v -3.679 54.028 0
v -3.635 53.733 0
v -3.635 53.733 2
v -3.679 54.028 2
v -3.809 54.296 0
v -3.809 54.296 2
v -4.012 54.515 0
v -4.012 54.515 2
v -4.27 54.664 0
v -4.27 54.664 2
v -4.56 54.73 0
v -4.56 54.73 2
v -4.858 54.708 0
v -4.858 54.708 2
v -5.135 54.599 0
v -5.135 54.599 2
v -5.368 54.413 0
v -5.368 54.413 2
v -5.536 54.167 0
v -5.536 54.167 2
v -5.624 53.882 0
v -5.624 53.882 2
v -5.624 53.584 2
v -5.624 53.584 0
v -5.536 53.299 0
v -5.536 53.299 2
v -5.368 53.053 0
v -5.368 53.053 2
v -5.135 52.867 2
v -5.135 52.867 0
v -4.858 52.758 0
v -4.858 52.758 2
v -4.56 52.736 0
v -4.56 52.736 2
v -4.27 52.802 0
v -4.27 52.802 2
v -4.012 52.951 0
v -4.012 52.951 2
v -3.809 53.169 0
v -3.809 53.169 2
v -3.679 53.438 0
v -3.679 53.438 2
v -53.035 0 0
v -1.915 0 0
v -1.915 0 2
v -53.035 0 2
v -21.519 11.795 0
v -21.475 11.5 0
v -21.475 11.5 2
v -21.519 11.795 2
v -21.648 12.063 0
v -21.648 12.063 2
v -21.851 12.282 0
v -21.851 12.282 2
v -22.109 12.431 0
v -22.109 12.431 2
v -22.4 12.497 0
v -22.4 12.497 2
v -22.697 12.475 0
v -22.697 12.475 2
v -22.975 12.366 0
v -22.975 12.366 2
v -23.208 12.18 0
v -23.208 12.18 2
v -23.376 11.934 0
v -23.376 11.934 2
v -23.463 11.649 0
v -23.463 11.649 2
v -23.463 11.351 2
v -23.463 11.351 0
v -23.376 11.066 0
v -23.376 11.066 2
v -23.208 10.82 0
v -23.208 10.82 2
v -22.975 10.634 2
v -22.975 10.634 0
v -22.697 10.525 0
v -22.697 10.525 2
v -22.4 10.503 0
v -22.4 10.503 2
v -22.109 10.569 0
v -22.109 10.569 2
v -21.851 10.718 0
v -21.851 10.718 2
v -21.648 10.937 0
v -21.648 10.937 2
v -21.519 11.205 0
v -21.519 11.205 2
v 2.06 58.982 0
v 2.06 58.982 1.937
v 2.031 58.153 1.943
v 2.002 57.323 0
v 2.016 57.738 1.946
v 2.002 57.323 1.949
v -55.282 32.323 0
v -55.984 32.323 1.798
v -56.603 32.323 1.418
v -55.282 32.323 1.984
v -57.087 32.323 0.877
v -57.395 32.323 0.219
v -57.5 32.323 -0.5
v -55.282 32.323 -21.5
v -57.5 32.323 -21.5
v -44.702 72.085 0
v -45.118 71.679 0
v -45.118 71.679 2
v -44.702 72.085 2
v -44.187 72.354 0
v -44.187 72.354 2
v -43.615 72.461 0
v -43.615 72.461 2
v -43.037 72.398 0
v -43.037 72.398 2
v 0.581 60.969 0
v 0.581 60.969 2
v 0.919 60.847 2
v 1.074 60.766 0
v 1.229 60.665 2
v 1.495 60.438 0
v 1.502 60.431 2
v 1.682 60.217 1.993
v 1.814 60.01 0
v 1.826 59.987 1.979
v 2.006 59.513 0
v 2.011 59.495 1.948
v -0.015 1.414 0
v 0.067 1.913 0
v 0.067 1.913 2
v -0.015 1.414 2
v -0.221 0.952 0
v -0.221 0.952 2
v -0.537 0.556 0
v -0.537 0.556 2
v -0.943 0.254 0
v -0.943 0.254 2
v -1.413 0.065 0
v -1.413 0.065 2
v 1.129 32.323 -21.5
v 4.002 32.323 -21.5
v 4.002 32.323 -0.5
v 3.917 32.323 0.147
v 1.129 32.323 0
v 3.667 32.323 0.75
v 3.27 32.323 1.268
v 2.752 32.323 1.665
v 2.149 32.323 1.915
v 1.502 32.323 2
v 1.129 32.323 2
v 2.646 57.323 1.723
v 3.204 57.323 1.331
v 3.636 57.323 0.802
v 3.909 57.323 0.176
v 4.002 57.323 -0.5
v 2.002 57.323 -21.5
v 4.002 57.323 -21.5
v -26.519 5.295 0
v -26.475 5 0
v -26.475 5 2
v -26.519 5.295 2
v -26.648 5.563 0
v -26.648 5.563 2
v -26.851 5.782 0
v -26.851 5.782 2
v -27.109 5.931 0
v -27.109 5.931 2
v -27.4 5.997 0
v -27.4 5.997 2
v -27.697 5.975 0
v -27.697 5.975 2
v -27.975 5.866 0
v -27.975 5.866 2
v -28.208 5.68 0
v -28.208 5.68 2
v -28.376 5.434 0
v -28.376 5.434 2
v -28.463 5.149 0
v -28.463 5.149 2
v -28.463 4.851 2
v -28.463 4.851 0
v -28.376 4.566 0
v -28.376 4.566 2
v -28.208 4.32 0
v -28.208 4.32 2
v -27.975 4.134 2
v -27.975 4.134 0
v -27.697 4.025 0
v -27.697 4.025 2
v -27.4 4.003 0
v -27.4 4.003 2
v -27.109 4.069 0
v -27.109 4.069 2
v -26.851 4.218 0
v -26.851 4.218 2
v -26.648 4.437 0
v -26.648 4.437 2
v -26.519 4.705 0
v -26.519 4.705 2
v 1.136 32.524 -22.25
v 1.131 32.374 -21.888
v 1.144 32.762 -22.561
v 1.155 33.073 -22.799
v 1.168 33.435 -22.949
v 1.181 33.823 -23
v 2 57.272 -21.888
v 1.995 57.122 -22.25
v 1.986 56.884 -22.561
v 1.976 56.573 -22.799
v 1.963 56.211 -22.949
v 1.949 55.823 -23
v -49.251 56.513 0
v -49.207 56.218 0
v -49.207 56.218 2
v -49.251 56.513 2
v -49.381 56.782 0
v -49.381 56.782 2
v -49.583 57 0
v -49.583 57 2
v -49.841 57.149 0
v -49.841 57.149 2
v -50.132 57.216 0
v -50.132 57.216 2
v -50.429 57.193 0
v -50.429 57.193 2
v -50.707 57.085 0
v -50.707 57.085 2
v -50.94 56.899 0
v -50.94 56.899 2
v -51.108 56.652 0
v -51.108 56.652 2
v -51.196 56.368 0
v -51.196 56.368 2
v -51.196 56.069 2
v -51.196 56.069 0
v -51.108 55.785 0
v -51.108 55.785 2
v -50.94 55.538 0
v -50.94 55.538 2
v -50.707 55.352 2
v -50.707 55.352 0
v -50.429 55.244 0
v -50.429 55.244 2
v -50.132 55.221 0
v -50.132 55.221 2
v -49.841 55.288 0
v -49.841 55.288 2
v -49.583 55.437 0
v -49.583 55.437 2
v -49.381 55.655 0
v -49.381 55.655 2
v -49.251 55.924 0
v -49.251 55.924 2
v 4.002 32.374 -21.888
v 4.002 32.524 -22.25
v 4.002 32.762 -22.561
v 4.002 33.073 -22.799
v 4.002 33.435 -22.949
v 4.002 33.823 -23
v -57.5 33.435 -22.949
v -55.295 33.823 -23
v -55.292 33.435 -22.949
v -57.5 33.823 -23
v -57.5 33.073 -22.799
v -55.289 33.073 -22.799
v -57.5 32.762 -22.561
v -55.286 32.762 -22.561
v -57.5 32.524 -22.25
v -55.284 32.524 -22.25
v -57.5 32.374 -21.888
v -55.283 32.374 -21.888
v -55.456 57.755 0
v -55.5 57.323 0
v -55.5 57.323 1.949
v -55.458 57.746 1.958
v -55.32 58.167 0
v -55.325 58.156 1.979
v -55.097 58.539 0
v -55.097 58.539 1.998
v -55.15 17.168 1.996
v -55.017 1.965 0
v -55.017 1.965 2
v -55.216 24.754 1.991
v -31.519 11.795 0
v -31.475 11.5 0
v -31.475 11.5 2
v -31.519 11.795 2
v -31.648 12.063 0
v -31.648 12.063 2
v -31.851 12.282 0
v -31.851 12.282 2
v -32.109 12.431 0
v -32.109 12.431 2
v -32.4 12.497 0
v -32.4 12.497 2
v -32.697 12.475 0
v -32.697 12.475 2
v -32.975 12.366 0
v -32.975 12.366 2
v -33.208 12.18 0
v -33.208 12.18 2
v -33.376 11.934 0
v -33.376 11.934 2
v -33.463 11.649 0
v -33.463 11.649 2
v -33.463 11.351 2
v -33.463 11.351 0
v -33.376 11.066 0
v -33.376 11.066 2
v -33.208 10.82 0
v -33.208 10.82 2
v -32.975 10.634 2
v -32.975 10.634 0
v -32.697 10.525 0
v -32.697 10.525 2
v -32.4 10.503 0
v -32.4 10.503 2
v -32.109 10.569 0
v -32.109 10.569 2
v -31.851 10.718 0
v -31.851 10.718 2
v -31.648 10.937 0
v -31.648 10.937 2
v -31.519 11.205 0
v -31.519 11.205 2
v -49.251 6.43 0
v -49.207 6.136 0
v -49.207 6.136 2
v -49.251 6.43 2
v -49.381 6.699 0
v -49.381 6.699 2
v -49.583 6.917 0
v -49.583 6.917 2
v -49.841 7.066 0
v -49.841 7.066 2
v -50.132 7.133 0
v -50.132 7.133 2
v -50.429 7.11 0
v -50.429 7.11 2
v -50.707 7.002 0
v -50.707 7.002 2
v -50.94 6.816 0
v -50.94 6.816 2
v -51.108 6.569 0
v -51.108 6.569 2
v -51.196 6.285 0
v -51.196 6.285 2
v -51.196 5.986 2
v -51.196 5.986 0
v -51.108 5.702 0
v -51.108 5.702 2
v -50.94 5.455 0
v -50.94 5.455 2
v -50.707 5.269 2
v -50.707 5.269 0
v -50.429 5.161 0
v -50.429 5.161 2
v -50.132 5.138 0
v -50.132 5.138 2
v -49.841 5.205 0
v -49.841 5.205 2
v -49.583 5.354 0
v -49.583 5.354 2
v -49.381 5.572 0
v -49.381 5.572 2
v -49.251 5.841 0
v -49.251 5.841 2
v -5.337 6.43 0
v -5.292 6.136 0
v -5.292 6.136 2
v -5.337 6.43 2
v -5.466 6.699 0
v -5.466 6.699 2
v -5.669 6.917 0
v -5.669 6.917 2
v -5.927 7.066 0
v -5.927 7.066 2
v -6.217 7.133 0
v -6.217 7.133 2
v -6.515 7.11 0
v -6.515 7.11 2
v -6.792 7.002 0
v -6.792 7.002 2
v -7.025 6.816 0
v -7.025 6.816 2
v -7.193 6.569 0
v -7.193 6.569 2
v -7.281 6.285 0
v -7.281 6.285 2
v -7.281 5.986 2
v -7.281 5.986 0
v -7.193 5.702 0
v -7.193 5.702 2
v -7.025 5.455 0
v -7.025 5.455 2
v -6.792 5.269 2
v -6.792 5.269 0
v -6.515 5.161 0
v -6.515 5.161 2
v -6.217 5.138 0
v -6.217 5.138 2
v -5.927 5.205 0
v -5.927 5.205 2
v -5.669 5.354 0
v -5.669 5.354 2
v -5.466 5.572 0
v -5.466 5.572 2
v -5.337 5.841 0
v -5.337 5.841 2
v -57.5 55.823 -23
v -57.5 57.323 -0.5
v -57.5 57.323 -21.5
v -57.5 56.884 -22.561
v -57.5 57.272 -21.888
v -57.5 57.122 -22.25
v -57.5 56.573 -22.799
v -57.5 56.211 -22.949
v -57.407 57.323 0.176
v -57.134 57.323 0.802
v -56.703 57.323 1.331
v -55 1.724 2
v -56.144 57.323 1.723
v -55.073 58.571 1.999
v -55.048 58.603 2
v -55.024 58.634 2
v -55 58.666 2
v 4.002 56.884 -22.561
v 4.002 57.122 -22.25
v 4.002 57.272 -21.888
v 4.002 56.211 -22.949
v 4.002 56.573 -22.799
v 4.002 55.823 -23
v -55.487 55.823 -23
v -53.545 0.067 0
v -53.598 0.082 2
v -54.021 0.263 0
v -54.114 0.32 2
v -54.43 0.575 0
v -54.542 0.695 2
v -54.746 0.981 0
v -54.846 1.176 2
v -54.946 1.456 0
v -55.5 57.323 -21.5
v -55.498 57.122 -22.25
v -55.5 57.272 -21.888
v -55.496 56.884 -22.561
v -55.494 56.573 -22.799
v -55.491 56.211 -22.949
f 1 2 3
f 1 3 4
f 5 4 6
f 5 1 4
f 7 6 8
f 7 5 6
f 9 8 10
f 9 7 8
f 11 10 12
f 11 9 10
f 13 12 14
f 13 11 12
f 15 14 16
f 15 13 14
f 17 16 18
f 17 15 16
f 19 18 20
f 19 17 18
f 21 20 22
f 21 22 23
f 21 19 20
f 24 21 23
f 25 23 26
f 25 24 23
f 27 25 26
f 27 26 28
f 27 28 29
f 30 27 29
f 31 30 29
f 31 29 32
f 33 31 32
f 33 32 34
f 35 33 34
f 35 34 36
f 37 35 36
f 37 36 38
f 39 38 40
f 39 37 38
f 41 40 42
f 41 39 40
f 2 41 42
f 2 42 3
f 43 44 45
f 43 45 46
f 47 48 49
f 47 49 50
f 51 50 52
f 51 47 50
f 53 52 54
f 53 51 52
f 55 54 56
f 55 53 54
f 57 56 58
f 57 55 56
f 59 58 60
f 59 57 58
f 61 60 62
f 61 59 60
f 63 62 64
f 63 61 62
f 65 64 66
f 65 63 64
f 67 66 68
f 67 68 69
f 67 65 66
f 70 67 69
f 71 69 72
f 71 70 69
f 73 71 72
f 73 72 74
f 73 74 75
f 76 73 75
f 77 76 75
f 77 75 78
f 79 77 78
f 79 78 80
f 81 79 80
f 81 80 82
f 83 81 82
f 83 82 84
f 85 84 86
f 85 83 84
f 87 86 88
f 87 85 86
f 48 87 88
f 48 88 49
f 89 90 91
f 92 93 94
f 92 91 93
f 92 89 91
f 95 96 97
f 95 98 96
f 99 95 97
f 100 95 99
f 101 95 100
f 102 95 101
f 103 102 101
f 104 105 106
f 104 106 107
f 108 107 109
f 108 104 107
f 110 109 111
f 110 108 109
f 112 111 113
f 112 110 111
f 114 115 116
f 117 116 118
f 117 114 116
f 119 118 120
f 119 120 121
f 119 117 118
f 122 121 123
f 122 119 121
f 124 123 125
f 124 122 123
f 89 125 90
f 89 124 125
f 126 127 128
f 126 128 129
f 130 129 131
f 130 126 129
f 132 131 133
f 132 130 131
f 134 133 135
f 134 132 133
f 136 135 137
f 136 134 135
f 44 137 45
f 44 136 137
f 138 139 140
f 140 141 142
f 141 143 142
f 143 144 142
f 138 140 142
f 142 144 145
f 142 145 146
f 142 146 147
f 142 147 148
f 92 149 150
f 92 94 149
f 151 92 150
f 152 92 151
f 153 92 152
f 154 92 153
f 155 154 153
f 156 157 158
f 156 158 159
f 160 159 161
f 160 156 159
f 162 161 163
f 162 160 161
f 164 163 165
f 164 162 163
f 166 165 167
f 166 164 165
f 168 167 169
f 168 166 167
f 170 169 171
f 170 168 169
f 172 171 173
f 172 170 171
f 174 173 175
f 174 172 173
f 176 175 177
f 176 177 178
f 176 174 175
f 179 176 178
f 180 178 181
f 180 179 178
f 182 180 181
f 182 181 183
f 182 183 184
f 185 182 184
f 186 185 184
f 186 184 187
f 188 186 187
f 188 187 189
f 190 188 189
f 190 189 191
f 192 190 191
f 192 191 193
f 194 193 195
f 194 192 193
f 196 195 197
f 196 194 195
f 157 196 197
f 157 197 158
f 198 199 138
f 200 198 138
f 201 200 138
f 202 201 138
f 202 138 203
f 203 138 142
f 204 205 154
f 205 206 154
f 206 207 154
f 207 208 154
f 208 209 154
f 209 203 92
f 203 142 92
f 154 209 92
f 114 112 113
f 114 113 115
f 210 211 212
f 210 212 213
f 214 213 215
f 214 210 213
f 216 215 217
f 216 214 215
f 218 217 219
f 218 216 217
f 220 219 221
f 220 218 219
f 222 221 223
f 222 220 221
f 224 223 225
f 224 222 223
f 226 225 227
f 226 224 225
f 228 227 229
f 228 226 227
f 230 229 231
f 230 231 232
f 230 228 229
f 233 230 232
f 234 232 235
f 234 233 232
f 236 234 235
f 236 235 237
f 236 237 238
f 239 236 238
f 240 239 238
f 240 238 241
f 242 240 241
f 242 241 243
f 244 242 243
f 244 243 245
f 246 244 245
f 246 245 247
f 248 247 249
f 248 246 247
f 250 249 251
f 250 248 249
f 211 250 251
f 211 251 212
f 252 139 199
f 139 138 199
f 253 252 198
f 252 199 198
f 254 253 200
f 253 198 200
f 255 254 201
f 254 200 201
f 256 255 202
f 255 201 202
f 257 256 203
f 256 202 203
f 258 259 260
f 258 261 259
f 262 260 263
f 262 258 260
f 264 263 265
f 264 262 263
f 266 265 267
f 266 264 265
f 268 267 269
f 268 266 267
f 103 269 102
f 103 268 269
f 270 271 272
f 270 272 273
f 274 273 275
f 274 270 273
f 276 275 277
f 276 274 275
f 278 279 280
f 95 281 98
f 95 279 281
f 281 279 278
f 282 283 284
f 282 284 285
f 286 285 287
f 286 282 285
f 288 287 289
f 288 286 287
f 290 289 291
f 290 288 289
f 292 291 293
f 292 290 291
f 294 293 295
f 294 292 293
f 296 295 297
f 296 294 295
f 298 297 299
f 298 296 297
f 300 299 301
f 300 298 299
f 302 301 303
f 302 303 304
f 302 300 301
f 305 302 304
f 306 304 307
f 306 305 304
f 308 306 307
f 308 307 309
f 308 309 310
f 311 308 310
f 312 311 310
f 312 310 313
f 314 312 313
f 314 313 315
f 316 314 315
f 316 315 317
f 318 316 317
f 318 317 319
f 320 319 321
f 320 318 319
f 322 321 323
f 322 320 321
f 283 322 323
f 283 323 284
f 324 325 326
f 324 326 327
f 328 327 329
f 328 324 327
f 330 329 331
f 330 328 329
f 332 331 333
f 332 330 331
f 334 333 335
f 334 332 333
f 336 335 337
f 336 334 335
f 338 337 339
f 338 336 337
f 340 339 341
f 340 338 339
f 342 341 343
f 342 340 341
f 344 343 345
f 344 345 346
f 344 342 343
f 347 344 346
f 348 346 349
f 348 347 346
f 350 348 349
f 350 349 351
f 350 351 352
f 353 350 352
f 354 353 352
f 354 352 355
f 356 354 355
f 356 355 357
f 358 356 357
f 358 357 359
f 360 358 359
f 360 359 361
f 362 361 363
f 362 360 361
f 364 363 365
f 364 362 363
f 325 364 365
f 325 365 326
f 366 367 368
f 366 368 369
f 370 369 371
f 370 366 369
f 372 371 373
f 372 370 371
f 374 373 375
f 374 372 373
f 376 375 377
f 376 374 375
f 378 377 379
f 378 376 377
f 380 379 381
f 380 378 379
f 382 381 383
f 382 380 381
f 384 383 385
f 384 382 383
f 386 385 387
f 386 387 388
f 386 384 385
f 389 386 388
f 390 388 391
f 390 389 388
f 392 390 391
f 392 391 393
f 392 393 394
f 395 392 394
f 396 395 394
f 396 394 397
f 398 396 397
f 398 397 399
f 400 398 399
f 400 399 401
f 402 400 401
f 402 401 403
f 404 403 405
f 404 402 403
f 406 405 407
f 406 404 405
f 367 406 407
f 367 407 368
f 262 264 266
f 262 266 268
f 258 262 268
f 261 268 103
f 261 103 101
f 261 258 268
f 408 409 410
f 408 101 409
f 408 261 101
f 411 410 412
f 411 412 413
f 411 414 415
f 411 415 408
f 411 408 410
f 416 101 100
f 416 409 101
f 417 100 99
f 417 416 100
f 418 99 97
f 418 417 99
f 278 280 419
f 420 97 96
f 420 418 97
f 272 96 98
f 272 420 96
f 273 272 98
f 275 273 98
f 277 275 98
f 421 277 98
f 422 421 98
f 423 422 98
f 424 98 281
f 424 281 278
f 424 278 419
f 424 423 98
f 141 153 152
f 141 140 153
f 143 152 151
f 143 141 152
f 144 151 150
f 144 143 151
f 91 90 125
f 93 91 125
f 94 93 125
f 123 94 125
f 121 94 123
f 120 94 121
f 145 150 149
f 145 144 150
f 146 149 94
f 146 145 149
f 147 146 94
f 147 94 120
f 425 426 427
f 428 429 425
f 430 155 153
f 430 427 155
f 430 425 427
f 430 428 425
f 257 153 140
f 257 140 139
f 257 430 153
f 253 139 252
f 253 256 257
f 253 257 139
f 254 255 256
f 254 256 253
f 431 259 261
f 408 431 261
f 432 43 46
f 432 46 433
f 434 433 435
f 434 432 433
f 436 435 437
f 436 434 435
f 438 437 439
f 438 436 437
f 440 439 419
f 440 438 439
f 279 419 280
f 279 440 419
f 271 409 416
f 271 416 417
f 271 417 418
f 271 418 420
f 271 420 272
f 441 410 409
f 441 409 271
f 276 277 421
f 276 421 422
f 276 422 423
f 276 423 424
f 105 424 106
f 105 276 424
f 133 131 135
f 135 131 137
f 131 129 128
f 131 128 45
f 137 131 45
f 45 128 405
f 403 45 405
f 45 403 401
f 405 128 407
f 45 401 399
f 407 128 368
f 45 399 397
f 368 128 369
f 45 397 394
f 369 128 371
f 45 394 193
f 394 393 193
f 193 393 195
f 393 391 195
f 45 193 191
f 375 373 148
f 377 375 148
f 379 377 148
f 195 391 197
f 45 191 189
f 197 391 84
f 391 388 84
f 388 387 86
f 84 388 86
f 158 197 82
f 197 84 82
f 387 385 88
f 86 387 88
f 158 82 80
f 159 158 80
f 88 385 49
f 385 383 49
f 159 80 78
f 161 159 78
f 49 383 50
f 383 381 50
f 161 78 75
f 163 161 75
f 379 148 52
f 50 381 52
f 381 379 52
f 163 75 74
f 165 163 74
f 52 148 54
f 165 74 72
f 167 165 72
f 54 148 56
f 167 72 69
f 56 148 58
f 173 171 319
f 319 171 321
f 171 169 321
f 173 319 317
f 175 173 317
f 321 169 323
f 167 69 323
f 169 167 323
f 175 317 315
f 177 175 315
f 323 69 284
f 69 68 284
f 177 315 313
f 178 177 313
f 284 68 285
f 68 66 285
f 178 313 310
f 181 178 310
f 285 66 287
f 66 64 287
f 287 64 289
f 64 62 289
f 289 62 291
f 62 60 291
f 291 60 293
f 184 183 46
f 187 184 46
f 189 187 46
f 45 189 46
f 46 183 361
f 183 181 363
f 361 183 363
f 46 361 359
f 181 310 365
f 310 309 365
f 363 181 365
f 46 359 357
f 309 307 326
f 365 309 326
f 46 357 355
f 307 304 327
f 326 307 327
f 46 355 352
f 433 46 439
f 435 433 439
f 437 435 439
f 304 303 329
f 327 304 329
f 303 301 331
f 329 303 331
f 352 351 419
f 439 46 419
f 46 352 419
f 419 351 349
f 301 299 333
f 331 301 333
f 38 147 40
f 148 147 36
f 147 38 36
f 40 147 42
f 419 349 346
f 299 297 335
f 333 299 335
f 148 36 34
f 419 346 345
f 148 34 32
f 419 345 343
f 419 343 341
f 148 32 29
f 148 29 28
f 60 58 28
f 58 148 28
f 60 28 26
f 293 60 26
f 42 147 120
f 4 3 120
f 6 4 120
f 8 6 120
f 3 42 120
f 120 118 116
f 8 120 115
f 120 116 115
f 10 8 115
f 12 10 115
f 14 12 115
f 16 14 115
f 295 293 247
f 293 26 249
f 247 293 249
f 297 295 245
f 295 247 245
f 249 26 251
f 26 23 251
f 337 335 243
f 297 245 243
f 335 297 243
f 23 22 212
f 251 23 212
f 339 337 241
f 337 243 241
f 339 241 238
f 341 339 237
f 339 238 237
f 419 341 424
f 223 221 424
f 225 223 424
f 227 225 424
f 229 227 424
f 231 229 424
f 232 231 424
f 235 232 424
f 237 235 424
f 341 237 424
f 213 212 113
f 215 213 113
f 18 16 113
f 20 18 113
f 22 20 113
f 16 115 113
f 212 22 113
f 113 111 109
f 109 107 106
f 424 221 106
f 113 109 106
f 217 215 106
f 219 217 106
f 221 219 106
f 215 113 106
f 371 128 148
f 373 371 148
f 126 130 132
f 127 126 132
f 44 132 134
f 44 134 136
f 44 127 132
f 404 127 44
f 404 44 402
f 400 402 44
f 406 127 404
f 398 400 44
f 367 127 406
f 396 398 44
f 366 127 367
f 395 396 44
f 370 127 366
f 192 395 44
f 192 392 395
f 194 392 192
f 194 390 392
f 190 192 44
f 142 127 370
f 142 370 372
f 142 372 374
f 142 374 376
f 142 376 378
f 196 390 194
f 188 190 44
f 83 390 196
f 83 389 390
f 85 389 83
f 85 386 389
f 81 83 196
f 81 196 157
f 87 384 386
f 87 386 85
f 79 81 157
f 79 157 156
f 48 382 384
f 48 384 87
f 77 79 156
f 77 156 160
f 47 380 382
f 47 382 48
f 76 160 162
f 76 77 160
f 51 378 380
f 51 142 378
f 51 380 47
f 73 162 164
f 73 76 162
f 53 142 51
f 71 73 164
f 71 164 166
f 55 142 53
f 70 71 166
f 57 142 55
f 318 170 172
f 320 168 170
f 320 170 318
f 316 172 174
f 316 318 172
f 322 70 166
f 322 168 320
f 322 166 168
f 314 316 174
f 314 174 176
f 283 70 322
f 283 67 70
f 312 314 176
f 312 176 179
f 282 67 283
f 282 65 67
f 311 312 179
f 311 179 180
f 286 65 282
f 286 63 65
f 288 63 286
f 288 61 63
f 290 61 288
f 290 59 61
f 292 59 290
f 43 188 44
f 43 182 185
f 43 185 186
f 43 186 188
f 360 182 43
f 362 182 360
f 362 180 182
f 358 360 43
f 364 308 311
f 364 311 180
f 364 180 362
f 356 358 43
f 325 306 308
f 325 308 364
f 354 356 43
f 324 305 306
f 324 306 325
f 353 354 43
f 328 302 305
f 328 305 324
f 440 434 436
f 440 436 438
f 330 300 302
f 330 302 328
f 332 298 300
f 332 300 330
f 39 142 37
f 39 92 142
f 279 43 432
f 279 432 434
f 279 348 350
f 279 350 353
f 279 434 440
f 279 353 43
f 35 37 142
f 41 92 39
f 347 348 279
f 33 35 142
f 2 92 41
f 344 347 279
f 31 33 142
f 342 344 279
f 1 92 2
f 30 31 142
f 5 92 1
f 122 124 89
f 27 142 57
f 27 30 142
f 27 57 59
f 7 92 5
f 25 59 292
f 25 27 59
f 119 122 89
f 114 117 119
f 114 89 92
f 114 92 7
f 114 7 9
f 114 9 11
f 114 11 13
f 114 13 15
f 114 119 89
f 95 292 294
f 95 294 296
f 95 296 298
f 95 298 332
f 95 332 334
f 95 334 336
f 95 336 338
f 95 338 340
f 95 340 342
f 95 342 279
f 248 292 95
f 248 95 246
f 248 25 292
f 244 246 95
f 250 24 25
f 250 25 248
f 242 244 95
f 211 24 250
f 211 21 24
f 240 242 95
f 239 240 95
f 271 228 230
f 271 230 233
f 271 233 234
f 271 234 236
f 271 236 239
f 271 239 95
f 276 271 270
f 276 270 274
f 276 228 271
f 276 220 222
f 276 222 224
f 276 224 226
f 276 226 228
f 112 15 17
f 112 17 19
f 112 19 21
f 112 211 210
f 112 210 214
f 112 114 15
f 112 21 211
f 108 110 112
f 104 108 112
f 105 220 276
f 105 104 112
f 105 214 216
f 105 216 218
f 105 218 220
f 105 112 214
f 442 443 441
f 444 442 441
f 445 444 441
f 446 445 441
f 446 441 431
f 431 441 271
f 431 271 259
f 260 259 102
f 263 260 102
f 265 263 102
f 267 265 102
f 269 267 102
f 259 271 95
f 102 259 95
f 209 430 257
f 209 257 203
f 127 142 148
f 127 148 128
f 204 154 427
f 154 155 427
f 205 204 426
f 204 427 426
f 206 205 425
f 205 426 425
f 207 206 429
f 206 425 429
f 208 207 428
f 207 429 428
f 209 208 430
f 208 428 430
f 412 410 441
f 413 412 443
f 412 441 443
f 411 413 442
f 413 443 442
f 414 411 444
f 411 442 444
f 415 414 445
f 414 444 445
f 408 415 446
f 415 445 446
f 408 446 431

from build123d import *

# Parameters (mm, degrees)
SKETCH1_R             = 1
BOSS_EXTRUDE1_DEPTH   = 2
BOSS_EXTRUDE2_DEPTH   = 23
BOSS_EXTRUDE2_2_DEPTH = 23
BOSS_EXTRUDE3_DEPTH   = 2
FILLET1_R             = 2.5
FILLET2_R             = 1.5


with BuildPart() as part:
    # Sketch1 → Boss-Extrude1 (new body)
    with BuildSketch(Plane.XY):
        with BuildLine():
            Line((-1.914568893, 0), (-53.034632217, 0))
            ThreePointArc((-53.034632217, 0), (-54.430407674, 0.574584772), (-55.017150852, 1.965292948))
            Line((-55.017150852, 1.965292948), (-55.500249363, 57.322899279))
            ThreePointArc((-55.500249363, 57.322899279), (-55.399437354, 57.964587872), (-55.09663904, 58.539253421))
            Line((-55.09663904, 58.539253421), (-45.118252169, 71.678754712))
            ThreePointArc((-45.118252169, 71.678754712), (-44.186512298, 72.353695471), (-43.03683386, 72.39755554))
            Line((-43.03683386, 72.39755554), (0.580818713, 60.968995882))
            ThreePointArc((0.580818713, 60.968995882), (1.66875601, 60.234846813), (2.059695099, 58.981950551))
            Line((2.059695099, 58.981950551), (0.066817491, 1.913402589))
            ThreePointArc((0.066817491, 1.913402589), (-0.537343288, 0.556435263), (-1.914568893, 0))
        make_face()
        with Locations((-27.474600555, 5)):
            Circle(SKETCH1_R, mode=Mode.SUBTRACT)
        with Locations((-22.474600555, 11.5)):
            Circle(SKETCH1_R, mode=Mode.SUBTRACT)
        with Locations((-32.474600555, 11.5)):
            Circle(SKETCH1_R, mode=Mode.SUBTRACT)
        with Locations((-6.292158567, 6.135518638)):
            Circle(SKETCH1_R, mode=Mode.SUBTRACT)
        with Locations((-50.206815558, 6.135518638)):
            Circle(SKETCH1_R, mode=Mode.SUBTRACT)
        with Locations((-50.206815558, 56.218481747)):
            Circle(SKETCH1_R, mode=Mode.SUBTRACT)
        with Locations((-4.635001699, 53.732746446)):
            Circle(SKETCH1_R, mode=Mode.SUBTRACT)
    extrude(amount=BOSS_EXTRUDE1_DEPTH)



with BuildPart() as body_2:
    # Sketch2 → Boss-Extrude2 (new body)
    with BuildSketch(Plane(origin=(0, 0, 0), x_dir=(-1, 0, 0), z_dir=(0, 0, -1))):
        Polygon((-4.001759752, 32.322899279), (-1.128740515, 32.322899279), (-2.001759752, 57.322899279), (-4.001759752, 57.322899279), align=None)
    extrude(amount=BOSS_EXTRUDE2_DEPTH)


with BuildPart() as body_3:
    # Sketch2 → Boss-Extrude2 2 (new body)
    with BuildSketch(Plane(origin=(0, 0, 0), x_dir=(-1, 0, 0), z_dir=(0, 0, -1))):
        Polygon((57.500249363, 57.322899279), (55.500249363, 57.322899279), (55.282077669, 32.322899279), (57.500249363, 32.322899279), align=None)
    extrude(amount=BOSS_EXTRUDE2_2_DEPTH)


with BuildPart() as part_1:
    add(part.part)

    add(body_2.part)  # Boss-Extrude3 merges body 2

    add(body_3.part)  # Boss-Extrude3 merges body 3
    # Sketch3 → Boss-Extrude3 (add)
    with BuildSketch(Plane.XY):
        Polygon((-57.500249363, 57.322899279), (-55.500249363, 57.322899279), (-55.282077669, 32.322899279), (-57.500249363, 32.322899279), align=None)
        Polygon((2.001759752, 57.322899279), (4.001759752, 57.322899279), (4.001759752, 32.322899279), (1.128740515, 32.322899279), align=None)
    extrude(amount=BOSS_EXTRUDE3_DEPTH)

    # Fillet1
    fillet1_edges = [part_1.edges().sort_by_distance(p)[0] for p in [
        (4.001759752, 44.822899279, 2),
        (-57.500249363, 44.822899279, 2),
    ]]
    fillet(fillet1_edges, radius=FILLET1_R)

    # Fillet2
    fillet2_edges = [part_1.edges().sort_by_distance(p)[0] for p in [
        (3.001759752, 57.322899279, -23),
        (2.565250134, 32.322899279, -23),
        (-56.500249363, 57.322899279, -23),
        (-56.391163516, 32.322899279, -23),
    ]]
    fillet(fillet2_edges, radius=FILLET2_R)


solid = part_1.part
